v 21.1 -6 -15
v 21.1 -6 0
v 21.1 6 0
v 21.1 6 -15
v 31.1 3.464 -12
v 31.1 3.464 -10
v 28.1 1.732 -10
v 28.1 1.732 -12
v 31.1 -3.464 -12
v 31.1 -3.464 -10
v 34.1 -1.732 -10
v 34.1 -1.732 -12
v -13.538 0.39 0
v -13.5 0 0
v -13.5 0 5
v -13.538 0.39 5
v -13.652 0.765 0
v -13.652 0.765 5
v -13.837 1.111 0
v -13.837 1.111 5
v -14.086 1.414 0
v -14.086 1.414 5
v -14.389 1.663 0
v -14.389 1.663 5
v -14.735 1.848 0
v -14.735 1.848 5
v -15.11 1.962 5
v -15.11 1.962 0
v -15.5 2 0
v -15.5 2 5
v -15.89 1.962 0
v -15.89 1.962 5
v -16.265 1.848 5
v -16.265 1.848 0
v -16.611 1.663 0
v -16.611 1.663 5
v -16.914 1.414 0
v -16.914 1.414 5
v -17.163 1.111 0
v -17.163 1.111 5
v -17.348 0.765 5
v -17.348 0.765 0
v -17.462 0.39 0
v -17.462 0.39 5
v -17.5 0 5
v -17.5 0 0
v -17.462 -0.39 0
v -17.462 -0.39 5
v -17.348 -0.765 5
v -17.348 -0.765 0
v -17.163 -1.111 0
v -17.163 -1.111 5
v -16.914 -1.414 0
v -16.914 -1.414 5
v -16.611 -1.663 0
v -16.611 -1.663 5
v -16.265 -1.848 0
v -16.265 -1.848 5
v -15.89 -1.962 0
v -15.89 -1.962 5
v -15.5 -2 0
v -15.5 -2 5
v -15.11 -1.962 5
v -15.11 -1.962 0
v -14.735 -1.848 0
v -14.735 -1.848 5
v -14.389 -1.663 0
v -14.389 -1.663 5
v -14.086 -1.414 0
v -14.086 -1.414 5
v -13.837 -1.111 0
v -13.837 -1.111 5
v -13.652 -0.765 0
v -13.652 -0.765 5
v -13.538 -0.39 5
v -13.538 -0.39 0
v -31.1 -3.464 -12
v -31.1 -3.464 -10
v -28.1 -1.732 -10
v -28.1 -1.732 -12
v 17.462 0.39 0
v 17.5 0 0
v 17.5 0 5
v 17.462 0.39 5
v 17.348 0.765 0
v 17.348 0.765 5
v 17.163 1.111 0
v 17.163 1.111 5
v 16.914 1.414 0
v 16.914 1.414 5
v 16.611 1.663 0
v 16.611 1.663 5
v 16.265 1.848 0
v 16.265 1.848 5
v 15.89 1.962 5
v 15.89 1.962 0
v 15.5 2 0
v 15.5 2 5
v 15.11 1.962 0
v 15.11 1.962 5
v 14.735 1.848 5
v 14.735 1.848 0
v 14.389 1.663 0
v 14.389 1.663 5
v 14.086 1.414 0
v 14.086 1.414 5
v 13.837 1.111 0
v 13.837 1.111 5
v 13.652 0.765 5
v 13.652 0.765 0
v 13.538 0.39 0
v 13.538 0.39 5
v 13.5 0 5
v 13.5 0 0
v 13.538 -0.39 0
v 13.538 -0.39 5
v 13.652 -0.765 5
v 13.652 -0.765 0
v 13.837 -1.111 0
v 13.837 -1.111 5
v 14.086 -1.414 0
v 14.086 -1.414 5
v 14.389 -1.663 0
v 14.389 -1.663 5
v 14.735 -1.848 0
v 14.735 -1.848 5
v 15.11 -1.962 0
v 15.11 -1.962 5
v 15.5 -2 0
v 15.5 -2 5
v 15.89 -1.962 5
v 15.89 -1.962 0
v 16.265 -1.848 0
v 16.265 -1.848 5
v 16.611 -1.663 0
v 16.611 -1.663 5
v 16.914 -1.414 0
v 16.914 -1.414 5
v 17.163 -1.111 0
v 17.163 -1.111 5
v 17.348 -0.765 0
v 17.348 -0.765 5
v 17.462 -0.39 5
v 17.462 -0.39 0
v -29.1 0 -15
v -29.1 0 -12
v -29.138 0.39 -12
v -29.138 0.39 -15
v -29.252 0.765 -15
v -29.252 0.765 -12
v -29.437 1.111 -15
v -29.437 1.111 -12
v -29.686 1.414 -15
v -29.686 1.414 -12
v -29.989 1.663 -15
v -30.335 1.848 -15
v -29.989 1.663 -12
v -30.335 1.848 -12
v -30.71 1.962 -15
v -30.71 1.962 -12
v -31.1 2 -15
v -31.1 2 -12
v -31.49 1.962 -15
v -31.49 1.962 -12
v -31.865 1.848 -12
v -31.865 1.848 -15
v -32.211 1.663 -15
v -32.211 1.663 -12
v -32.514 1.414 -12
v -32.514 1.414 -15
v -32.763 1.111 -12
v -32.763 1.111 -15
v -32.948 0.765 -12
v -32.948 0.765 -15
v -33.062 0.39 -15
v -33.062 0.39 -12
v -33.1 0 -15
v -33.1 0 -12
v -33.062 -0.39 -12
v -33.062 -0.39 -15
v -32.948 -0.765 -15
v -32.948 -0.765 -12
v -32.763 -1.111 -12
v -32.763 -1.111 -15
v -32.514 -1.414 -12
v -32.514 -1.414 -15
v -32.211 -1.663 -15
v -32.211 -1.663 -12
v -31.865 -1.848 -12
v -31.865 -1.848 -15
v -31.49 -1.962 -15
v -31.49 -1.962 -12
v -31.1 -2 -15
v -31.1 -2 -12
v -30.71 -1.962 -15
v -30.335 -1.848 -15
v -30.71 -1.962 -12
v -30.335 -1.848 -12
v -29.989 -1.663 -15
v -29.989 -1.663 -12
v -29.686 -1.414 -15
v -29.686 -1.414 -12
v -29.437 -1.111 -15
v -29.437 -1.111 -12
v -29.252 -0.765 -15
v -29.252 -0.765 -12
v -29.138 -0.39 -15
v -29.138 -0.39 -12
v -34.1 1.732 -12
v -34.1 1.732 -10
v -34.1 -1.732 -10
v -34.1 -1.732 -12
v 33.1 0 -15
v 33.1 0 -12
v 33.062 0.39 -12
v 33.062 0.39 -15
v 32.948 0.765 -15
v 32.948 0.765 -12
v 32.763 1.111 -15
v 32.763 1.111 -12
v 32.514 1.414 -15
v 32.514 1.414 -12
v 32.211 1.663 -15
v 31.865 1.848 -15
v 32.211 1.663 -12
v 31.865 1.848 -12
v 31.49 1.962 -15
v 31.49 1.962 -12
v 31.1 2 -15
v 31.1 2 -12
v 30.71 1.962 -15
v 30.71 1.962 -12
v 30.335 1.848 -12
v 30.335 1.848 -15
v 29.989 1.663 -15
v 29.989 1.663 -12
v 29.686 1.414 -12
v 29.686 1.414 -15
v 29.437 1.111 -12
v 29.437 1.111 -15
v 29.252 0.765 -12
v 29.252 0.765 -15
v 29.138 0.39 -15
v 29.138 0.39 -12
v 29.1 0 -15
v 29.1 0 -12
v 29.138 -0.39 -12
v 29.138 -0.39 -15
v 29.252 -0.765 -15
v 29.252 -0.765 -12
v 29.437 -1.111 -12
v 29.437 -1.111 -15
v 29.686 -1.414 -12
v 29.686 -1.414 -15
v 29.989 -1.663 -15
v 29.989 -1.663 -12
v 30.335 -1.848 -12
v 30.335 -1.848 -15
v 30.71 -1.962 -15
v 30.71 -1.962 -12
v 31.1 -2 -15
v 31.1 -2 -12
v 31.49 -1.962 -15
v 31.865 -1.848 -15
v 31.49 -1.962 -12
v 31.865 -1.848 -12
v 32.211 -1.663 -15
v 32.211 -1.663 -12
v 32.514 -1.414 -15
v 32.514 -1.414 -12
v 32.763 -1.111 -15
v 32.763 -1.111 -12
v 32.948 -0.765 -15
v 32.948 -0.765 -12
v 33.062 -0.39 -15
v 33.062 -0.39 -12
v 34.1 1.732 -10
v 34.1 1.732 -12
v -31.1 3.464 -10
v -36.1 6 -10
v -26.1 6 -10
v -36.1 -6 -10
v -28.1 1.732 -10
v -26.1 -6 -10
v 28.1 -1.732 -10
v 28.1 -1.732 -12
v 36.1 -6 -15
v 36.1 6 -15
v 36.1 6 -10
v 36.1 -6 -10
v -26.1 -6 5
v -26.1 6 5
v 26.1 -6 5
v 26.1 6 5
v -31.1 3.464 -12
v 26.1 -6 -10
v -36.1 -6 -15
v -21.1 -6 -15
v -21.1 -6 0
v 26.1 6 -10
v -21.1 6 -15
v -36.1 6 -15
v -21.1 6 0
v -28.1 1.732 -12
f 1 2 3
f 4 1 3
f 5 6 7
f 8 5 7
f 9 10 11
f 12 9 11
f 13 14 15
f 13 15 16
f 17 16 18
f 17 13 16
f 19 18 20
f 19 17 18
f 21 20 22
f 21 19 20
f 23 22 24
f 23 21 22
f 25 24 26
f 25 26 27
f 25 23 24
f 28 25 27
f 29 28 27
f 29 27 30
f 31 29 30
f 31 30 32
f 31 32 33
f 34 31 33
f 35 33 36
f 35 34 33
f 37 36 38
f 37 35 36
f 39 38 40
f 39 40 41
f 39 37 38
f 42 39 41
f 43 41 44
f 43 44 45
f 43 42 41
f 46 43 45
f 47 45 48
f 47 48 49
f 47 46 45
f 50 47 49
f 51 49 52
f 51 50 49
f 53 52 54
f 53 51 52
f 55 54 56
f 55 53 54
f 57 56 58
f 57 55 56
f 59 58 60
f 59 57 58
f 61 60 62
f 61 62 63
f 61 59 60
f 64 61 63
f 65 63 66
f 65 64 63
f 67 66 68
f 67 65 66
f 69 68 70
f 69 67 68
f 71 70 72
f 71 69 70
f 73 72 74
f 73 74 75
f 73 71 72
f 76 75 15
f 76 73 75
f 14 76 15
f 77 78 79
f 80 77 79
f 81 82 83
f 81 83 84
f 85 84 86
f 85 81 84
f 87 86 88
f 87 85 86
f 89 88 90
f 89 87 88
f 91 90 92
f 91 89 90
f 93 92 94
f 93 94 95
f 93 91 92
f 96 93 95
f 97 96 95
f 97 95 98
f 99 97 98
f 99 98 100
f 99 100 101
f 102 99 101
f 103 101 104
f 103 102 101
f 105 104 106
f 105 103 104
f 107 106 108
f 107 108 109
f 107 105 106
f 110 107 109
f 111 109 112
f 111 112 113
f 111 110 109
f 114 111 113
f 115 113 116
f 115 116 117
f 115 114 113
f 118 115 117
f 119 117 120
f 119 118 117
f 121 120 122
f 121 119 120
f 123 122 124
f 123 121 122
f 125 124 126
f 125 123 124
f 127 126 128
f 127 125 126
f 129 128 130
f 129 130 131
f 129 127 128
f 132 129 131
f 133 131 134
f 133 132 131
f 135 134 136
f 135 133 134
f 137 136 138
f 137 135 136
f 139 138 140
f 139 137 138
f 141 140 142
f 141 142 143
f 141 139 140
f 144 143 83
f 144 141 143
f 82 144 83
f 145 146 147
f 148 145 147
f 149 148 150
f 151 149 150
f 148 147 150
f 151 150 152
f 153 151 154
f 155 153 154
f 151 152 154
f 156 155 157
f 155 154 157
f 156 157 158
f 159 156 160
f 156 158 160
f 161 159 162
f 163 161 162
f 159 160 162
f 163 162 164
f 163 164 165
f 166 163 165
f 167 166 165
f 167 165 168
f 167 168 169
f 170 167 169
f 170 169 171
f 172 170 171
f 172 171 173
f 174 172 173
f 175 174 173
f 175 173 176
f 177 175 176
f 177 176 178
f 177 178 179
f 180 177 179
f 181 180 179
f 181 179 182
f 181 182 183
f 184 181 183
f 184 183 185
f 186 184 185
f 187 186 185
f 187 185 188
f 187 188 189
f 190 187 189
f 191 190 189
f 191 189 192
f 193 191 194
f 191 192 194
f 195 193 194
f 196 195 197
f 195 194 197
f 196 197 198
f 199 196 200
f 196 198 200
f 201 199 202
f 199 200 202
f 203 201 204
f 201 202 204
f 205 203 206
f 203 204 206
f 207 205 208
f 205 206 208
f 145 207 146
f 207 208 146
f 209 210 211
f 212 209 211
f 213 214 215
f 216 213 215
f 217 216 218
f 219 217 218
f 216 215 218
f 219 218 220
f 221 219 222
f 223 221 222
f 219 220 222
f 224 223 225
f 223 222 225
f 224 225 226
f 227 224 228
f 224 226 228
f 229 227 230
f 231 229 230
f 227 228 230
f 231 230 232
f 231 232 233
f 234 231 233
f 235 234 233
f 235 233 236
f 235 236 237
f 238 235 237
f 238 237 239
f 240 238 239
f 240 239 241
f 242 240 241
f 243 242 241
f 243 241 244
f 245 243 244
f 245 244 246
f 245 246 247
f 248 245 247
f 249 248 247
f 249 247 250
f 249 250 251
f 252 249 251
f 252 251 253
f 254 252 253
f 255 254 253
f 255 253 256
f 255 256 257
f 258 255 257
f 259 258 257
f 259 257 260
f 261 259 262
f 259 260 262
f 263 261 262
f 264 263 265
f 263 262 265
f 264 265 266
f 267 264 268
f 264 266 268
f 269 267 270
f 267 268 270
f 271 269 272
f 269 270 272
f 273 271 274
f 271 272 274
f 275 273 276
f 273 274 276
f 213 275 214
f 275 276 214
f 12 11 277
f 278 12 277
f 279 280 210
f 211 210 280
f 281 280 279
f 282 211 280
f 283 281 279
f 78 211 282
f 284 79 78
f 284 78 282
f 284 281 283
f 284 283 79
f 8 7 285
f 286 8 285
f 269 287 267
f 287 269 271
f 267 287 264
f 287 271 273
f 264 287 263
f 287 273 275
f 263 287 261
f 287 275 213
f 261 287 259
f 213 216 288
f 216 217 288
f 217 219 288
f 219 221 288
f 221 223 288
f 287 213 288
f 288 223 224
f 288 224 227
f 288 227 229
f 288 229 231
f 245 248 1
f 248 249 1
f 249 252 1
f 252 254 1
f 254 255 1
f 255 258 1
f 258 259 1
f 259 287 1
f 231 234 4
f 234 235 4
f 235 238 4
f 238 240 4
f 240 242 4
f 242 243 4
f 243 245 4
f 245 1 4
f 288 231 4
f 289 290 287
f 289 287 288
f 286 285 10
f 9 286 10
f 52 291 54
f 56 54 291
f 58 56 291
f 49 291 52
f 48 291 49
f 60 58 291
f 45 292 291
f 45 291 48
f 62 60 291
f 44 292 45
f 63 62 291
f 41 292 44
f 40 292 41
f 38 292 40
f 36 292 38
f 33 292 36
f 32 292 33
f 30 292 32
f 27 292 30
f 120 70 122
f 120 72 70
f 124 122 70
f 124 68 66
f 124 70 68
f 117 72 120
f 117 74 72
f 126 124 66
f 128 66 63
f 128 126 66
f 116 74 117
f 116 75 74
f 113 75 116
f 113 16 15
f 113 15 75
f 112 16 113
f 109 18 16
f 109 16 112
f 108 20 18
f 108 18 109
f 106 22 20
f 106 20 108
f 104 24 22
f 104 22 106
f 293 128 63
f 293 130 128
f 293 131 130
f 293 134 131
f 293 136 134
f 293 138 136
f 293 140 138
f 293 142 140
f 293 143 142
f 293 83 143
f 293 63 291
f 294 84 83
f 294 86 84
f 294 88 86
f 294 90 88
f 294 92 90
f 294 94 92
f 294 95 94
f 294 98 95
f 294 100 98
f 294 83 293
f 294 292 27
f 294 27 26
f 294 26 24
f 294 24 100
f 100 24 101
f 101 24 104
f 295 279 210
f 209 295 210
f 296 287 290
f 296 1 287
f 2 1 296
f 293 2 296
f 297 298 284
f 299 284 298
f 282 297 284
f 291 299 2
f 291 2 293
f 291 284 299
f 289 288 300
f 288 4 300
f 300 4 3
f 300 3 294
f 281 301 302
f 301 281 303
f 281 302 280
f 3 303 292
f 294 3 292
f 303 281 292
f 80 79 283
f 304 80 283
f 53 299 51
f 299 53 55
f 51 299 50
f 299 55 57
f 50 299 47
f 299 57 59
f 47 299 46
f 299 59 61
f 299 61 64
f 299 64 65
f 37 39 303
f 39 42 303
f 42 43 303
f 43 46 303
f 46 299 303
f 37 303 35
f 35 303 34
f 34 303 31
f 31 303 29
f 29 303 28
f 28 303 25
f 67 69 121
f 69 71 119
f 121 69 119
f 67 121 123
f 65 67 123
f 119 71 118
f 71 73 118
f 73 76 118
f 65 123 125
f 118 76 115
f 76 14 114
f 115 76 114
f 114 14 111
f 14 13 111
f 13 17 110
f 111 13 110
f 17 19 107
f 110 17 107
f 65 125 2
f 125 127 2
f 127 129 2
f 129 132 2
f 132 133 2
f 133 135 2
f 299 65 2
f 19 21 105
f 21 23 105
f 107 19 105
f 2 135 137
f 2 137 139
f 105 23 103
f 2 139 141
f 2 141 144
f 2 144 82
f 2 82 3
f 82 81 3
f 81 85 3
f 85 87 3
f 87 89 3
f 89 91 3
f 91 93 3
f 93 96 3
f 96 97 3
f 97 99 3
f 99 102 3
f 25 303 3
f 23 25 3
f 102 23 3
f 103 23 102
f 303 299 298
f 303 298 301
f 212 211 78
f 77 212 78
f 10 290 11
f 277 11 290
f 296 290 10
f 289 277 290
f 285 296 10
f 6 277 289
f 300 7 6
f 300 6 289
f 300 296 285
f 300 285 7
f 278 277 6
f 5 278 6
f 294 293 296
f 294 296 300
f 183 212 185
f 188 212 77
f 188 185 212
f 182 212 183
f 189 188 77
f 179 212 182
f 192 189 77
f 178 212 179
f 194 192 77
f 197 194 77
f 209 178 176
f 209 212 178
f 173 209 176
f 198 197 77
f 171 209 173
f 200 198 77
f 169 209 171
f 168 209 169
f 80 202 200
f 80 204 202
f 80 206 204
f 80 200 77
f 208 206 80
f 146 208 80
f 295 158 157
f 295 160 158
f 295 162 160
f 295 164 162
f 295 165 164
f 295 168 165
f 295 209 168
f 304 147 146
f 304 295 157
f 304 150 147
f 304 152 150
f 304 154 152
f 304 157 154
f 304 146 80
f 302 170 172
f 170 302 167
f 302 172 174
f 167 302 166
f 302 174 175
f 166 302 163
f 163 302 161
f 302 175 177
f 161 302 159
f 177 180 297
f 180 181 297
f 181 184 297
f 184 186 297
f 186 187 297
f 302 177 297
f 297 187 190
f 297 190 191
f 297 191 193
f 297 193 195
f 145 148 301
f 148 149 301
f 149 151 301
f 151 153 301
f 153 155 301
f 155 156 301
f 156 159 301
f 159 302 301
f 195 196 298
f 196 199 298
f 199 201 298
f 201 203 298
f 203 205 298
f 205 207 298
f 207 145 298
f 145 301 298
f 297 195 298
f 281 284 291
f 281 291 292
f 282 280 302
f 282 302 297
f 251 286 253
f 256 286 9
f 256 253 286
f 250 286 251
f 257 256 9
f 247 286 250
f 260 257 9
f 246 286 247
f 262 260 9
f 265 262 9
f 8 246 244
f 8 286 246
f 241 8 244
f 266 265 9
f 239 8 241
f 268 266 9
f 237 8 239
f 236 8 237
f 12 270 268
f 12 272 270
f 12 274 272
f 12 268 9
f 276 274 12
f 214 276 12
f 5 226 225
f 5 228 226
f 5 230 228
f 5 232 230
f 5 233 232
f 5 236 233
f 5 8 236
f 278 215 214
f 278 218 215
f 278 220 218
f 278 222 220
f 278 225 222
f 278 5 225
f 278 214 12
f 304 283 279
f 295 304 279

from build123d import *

# Parameters (mm, degrees)
F0_W     = 42.2
F0_H     = 12
F0_R     = 2
F0_W_2   = 5
F1_DEPTH = 5
F2_DEPTH = 15
F3_W     = 12
F3_H     = 5
F4_DEPTH = 10
F5_W     = 12
F5_H     = 5
F6_DEPTH = 10
F7_R     = 2
F8_DEPTH = 5
F9_DEPTH = 2


with BuildPart() as f1:
    # F0 (on Top) → F1 (new body)
    with BuildSketch(Plane.XY):
        Rectangle(F0_W, F0_H)
        with Locations((-15.5, 0)):
            Circle(F0_R, mode=Mode.SUBTRACT)
        with Locations((15.5, 0)):
            Circle(F0_R, mode=Mode.SUBTRACT)
        with Locations((23.6, 0)):
            Rectangle(F0_W_2, F0_H)
        with Locations((-23.6, 0)):
            Rectangle(F0_W_2, F0_H)
    extrude(amount=F1_DEPTH)

    # F0 (on Top) → F2 (join)
    with BuildSketch(Plane.XY):
        with Locations((23.6, 0)):
            Rectangle(F0_W_2, F0_H)
        with Locations((-23.6, 0)):
            Rectangle(F0_W_2, F0_H)
    extrude(amount=-F2_DEPTH)

    # F3 (on face) → F4 (join)
    with BuildSketch(Plane(origin=(-26.1, 0, 0), x_dir=(0, -1, 0), z_dir=(-1, 0, 0))):
        with Locations((0, -12.5)):
            Rectangle(F3_W, F3_H)
    extrude(amount=F4_DEPTH)

    # F5 (on face) → F6 (join)
    with BuildSketch(Plane.YZ.offset(26.1)):
        with Locations((0, -12.5)):
            Rectangle(F5_W, F5_H)
    extrude(amount=F6_DEPTH)

    # F7 (on face) → F8 (cut)
    with BuildSketch(Plane.XY.offset(-10)):
        with Locations((31.1, 0)):
            Circle(F7_R)
        with Locations((-31.1, 0)):
            Circle(F7_R)
    extrude(amount=-F8_DEPTH, mode=Mode.SUBTRACT)

    # F7 (on face) → F9 (cut)
    with BuildSketch(Plane.XY.offset(-10)):
        Polygon((28.1, 1.732051), (28.1, -1.732051), (31.1, -3.464102), (34.1, -1.732051), (34.1, 1.732051), (31.1, 3.464102), align=None)
        with Locations((31.1, 0)):
            Circle(F7_R, mode=Mode.SUBTRACT)
        Polygon((-34.1, -1.732051), (-31.1, -3.464102), (-28.1, -1.732051), (-28.1, 1.732051), (-31.1, 3.464102), (-34.1, 1.732051), align=None)
        with Locations((-31.1, 0)):
            Circle(F7_R, mode=Mode.SUBTRACT)
    extrude(amount=-F9_DEPTH, mode=Mode.SUBTRACT)


solid = f1.part
